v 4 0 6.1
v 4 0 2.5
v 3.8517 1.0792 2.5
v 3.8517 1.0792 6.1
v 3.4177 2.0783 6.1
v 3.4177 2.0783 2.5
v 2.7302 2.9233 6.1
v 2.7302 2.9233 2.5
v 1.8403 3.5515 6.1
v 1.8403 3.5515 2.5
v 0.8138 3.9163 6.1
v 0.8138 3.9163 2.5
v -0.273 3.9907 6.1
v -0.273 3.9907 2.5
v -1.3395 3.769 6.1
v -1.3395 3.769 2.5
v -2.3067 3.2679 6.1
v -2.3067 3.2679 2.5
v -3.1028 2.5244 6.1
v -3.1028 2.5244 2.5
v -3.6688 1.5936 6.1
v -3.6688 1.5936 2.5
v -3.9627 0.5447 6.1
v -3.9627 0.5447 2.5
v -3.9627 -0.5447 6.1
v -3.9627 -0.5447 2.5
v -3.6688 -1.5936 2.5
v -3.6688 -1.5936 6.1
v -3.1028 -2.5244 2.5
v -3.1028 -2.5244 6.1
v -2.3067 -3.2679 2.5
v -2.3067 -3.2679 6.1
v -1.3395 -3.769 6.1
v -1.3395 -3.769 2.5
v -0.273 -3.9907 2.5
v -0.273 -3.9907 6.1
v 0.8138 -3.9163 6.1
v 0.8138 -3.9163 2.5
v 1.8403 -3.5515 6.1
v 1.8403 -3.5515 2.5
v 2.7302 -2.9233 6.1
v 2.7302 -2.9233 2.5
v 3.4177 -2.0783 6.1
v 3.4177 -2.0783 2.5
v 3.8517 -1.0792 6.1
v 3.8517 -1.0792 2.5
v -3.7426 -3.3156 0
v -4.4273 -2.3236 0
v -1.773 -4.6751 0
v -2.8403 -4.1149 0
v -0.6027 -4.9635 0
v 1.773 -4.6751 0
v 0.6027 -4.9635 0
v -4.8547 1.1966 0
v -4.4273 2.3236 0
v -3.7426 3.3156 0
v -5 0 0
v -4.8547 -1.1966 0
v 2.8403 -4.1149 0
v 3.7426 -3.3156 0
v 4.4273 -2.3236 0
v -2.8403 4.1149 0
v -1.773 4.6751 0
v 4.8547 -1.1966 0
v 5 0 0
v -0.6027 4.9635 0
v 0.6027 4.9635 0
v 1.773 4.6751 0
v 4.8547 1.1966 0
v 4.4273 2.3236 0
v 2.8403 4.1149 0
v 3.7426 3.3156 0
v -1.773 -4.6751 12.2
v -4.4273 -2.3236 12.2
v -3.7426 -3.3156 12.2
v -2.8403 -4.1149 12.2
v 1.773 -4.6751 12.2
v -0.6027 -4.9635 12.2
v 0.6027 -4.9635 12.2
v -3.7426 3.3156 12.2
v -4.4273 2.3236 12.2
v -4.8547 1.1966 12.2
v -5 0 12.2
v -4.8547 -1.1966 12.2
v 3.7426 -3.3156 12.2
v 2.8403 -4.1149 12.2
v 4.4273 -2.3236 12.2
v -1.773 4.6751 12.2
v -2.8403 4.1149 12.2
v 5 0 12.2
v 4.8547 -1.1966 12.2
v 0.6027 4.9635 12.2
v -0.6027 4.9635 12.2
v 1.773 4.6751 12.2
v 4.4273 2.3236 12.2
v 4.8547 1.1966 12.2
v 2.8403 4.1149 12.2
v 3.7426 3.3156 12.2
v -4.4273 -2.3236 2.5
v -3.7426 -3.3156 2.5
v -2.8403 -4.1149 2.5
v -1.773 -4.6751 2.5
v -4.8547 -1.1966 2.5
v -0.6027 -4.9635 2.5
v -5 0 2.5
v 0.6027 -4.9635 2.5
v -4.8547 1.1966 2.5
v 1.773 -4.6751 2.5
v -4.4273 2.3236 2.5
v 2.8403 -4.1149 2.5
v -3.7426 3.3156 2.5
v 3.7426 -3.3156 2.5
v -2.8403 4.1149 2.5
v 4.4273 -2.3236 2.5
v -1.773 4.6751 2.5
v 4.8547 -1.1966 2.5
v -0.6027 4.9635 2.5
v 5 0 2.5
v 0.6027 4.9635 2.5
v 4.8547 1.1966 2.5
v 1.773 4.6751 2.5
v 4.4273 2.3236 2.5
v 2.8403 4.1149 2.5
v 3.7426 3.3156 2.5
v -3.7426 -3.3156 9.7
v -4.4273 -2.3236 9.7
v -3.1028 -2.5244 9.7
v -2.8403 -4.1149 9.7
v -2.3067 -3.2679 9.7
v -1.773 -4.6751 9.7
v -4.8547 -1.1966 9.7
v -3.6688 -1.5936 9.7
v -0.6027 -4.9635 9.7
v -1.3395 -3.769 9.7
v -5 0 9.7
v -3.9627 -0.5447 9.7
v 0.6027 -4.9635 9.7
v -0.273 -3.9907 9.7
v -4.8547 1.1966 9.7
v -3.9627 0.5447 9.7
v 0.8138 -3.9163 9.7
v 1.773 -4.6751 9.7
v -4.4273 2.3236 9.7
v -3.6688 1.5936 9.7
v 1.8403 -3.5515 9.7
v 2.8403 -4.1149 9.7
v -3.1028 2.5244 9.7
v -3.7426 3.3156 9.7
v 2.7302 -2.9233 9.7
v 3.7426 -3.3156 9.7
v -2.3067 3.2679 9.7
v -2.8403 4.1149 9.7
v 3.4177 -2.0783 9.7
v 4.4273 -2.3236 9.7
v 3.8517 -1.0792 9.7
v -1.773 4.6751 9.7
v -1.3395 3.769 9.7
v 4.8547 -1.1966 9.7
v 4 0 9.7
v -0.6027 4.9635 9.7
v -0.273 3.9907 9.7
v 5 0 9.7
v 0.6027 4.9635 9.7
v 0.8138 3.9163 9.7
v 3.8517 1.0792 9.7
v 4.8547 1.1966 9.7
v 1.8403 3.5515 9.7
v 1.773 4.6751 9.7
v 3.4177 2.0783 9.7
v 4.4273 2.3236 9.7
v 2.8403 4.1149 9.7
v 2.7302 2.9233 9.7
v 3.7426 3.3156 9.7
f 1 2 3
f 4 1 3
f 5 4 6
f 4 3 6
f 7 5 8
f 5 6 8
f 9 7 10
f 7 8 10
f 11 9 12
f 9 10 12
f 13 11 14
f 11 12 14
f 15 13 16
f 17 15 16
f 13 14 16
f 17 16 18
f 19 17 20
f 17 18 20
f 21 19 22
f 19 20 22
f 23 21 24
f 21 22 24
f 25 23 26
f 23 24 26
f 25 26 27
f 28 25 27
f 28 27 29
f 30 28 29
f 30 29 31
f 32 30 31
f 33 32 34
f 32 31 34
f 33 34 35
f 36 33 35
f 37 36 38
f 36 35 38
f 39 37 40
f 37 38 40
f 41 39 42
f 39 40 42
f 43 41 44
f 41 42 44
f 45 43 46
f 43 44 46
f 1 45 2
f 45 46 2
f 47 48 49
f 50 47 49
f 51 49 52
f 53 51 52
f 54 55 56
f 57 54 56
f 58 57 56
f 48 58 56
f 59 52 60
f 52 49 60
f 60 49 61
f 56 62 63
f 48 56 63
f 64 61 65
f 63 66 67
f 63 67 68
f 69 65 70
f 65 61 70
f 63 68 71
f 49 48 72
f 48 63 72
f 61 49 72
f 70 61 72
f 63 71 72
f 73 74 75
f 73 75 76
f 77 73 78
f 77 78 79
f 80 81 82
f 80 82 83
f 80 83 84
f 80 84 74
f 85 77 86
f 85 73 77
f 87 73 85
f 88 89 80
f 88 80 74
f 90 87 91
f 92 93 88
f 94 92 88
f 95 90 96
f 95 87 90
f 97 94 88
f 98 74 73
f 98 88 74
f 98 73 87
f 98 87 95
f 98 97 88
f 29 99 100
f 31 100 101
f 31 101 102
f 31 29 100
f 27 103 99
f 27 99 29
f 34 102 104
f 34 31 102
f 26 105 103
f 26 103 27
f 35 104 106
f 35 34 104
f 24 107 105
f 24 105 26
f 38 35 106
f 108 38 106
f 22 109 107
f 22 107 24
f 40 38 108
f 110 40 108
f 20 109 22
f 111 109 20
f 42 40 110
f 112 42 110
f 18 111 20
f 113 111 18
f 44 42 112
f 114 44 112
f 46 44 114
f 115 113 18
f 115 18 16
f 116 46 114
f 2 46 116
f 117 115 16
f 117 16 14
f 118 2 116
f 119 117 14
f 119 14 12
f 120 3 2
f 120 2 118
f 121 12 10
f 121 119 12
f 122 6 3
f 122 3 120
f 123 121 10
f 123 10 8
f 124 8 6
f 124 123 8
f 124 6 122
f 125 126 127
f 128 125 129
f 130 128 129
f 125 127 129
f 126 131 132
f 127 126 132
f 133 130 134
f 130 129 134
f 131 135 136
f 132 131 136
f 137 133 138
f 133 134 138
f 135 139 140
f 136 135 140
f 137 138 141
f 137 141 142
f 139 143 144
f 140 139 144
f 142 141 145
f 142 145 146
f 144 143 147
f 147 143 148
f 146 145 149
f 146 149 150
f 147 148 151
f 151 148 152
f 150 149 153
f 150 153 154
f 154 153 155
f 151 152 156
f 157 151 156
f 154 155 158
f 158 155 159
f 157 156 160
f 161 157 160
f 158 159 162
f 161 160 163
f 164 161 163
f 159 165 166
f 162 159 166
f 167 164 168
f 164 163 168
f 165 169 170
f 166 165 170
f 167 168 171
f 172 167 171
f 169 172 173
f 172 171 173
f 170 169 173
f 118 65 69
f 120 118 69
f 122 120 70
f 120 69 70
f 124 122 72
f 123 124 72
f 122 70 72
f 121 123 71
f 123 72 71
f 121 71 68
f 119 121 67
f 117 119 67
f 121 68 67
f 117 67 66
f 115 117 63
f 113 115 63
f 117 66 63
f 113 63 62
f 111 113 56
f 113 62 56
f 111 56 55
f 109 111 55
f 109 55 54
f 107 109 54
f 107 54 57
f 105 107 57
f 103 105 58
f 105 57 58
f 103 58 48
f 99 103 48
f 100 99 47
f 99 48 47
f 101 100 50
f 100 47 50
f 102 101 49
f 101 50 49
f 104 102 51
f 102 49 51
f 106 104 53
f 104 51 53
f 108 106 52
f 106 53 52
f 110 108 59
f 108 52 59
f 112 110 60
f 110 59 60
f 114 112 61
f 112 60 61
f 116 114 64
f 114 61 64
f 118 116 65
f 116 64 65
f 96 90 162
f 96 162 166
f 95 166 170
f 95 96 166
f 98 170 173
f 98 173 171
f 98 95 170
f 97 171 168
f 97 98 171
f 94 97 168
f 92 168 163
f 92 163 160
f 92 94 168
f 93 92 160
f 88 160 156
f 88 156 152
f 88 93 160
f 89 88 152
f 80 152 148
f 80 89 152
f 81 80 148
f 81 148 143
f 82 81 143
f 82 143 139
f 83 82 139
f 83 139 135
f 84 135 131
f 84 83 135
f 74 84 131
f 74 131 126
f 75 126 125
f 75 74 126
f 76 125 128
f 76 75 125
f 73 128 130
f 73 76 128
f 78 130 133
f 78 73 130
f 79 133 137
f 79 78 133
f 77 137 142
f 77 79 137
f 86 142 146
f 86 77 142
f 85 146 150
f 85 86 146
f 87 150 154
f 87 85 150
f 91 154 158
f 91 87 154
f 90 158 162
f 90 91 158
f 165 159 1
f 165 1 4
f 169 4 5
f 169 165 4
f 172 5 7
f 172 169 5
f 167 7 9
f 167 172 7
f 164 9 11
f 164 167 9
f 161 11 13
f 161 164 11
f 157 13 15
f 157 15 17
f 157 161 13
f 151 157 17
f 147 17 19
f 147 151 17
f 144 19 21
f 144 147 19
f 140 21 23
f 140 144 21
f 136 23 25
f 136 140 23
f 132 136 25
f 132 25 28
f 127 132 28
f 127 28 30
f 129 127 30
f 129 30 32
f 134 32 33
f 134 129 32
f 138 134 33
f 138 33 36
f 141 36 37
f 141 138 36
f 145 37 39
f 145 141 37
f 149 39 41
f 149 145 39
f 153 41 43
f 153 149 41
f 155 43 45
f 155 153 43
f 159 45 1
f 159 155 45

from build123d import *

# Parameters (mm, degrees)
F0_R     = 5
F1_DEPTH = 2.5
F2_R     = 4
F3_DEPTH = 3.6


with BuildPart() as f1:
    # F0 (on Top) → F1 (new body)
    with BuildSketch(Plane.XY):
        Circle(F0_R)
    extrude(amount=F1_DEPTH)

    # F2 (on face) → F3 (join)
    with BuildSketch(Plane.XY.offset(2.5)):
        Circle(F2_R)
    extrude(amount=F3_DEPTH)

    # F5: F1 across plane


with BuildPart() as f1_1:
    add(f1.part)
    add(f1.part.mirror(Plane.XY.offset(6.1)))


solid = f1_1.part
